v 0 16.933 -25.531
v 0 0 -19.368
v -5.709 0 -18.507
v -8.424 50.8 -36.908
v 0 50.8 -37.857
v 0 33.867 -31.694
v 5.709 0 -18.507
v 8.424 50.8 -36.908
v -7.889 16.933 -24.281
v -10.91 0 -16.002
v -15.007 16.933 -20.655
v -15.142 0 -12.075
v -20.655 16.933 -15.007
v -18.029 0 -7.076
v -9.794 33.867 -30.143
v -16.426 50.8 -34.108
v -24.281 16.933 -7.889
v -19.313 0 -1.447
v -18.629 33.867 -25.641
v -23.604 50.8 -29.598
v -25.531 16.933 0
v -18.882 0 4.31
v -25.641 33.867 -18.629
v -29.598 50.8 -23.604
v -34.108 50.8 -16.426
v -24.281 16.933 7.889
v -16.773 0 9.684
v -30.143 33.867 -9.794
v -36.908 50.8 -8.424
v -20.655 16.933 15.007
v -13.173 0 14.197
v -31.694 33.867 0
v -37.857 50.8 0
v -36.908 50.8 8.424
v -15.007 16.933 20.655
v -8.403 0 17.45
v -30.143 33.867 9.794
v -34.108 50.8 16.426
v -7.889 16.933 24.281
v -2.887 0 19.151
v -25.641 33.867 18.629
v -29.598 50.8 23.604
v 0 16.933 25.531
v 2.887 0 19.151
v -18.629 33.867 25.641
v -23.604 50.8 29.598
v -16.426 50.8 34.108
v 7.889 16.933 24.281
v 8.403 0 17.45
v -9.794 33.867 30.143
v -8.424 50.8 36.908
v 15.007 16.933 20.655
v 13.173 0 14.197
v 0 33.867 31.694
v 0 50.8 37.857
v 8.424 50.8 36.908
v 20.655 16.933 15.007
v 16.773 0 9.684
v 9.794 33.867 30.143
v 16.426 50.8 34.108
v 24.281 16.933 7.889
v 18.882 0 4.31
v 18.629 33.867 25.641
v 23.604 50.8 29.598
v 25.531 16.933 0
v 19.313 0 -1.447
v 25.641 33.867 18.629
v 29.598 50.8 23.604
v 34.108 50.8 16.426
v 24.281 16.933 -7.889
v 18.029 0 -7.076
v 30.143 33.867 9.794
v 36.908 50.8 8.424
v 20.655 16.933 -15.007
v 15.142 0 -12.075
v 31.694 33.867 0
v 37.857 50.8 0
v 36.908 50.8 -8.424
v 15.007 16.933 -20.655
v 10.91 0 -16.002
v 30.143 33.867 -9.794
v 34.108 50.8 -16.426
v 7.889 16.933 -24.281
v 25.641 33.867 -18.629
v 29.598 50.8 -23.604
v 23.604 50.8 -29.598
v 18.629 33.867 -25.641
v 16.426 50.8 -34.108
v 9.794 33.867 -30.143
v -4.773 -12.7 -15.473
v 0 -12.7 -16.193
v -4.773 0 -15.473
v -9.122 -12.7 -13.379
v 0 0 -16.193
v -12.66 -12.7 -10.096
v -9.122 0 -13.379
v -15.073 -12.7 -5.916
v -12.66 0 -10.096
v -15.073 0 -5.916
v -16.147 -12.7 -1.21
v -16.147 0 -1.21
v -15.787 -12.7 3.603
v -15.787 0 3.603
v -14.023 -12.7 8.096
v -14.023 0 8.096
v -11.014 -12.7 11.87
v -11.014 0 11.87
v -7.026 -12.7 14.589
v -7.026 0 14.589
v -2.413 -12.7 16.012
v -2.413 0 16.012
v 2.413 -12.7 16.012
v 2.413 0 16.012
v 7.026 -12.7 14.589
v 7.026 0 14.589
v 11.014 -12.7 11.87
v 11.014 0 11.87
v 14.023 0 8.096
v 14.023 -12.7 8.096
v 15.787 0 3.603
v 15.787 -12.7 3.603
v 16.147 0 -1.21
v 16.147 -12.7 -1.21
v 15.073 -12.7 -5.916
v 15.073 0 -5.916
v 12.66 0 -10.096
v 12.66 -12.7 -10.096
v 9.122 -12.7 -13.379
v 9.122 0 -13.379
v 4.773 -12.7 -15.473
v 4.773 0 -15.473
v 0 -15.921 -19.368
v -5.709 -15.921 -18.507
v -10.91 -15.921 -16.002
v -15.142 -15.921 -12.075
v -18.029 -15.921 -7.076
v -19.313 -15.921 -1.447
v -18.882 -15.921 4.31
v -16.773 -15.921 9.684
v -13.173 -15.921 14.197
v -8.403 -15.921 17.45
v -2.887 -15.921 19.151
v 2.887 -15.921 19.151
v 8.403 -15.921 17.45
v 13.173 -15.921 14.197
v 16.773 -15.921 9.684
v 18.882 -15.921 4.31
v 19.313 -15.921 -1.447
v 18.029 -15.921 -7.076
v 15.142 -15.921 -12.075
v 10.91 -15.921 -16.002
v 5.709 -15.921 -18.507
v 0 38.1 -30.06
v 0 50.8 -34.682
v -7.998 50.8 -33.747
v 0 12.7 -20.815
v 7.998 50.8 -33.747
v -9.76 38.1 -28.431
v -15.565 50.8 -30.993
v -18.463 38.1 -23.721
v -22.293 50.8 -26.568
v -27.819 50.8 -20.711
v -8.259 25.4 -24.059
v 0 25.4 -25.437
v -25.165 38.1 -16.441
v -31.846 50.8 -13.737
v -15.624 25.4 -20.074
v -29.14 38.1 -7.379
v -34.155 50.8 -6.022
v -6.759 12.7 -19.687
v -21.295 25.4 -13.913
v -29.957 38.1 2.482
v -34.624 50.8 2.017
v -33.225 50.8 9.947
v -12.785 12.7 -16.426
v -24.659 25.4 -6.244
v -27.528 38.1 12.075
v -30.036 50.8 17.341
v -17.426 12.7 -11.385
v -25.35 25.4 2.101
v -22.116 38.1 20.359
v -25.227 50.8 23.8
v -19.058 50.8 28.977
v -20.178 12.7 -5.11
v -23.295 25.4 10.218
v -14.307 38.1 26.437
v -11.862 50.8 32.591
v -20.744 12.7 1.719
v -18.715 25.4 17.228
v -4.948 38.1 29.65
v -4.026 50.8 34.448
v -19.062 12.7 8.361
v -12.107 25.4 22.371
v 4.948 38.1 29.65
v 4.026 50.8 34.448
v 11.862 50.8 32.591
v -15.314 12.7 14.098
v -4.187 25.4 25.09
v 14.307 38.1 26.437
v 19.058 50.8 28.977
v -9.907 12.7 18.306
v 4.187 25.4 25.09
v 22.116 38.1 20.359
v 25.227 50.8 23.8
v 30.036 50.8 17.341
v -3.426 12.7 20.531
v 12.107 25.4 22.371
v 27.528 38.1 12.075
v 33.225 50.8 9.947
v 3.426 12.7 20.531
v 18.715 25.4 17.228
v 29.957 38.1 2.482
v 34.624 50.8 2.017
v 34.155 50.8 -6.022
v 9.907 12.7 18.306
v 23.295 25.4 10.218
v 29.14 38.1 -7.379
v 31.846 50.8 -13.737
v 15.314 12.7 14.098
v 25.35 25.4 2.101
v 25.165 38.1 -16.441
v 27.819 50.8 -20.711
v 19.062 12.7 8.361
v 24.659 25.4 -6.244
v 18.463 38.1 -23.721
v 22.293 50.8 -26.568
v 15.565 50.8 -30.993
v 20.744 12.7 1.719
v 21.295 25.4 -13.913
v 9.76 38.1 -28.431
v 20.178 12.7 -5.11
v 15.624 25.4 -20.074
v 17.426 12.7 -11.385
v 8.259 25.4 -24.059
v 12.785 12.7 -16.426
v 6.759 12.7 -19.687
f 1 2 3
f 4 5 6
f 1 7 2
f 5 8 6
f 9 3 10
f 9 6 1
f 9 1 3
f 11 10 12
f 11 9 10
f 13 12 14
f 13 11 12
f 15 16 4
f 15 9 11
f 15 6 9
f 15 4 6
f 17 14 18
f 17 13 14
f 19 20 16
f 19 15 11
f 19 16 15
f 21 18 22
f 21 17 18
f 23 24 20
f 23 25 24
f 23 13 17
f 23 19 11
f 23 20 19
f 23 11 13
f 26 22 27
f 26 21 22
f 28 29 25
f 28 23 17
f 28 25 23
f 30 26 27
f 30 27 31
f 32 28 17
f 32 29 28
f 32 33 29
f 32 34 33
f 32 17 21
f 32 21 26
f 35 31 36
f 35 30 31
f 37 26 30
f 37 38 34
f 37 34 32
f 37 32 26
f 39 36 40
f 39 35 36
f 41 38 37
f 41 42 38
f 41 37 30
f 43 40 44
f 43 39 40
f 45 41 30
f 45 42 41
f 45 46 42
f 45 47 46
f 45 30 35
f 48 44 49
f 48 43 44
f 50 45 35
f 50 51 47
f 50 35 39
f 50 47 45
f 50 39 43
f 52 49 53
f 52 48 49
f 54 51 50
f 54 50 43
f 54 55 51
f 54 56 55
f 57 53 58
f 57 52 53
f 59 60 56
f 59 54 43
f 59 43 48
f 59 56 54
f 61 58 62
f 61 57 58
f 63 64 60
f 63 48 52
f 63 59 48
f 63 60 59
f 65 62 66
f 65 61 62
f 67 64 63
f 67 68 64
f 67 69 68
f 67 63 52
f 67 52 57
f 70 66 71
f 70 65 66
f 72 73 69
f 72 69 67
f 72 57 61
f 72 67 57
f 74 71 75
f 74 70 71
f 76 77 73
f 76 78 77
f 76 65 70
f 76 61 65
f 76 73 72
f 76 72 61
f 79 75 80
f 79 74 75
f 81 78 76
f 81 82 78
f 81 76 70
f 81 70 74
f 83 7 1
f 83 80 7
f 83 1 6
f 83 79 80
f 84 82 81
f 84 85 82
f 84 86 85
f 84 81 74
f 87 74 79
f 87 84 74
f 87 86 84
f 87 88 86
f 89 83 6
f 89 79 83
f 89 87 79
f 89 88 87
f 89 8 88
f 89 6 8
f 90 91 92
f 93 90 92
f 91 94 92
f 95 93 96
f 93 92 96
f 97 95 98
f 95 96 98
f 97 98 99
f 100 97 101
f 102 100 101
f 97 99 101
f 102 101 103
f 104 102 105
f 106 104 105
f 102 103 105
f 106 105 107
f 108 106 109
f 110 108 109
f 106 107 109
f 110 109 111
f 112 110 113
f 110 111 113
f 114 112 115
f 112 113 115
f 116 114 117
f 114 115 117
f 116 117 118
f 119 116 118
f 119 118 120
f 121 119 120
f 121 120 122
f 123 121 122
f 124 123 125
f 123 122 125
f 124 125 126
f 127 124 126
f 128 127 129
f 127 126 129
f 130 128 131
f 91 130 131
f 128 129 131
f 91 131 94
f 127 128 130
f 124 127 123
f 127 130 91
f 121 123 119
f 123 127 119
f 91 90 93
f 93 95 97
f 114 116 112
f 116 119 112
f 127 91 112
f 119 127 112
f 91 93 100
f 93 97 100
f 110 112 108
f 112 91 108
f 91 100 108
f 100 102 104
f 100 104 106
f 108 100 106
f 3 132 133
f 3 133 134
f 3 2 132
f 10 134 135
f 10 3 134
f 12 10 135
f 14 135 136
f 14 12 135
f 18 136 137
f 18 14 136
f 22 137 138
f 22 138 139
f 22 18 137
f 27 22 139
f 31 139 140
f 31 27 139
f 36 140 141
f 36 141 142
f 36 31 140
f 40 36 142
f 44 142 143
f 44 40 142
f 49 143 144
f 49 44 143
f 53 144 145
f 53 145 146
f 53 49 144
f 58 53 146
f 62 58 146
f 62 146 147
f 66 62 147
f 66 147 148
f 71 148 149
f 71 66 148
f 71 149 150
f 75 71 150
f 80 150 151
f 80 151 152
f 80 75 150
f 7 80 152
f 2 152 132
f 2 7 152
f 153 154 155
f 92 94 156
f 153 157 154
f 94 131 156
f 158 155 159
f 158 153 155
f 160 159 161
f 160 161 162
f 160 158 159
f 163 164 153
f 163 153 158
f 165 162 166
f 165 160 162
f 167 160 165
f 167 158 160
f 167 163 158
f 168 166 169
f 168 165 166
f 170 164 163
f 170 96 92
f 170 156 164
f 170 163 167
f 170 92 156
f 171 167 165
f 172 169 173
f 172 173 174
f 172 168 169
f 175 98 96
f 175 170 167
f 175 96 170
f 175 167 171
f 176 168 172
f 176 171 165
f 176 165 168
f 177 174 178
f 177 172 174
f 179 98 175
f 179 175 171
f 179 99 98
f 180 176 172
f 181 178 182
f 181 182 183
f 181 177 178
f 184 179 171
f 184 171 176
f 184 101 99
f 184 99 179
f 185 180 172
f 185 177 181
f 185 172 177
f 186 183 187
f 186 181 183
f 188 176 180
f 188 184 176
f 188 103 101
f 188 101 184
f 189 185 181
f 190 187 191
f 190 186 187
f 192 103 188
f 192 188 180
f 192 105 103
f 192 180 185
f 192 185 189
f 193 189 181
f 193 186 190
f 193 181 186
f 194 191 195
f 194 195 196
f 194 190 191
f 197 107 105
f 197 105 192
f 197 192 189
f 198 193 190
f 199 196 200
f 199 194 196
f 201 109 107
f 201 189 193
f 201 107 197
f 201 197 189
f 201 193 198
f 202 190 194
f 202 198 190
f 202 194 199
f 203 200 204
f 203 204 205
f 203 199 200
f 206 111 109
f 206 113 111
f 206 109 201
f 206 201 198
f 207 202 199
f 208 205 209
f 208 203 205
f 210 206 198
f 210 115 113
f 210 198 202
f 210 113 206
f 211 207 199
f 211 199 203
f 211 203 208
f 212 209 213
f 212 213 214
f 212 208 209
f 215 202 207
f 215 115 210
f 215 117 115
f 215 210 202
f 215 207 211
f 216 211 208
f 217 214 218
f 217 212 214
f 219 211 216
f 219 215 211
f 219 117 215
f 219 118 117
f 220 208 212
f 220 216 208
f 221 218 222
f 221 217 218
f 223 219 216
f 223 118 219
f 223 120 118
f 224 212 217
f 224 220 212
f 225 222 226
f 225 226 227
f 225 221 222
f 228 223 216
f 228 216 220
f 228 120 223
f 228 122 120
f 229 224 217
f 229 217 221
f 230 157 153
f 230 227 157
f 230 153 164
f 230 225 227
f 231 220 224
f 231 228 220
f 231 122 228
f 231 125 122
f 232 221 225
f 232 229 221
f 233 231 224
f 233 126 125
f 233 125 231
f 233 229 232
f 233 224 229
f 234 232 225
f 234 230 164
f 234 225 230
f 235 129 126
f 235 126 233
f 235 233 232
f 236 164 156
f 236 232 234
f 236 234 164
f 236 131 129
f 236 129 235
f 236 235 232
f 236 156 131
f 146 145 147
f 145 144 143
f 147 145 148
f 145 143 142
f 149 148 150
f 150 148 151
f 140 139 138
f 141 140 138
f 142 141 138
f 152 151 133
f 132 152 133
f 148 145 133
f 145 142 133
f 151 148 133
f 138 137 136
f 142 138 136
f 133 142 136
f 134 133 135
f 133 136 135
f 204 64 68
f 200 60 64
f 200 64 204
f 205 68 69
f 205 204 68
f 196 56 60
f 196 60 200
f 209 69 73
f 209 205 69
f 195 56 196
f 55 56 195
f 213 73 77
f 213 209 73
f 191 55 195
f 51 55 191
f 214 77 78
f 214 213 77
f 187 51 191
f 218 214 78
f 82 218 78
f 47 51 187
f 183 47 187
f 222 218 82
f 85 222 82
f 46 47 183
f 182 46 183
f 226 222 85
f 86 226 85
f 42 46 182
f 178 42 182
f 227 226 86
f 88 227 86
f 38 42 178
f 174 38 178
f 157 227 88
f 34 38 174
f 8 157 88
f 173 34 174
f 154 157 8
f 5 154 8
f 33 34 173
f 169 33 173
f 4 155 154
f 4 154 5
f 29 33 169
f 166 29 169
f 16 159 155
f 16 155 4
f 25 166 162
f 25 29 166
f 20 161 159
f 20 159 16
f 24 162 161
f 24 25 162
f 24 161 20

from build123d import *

# Parameters (mm, degrees)
SKETCH1_W = 3.175
SKETCH1_H = 12.7


with BuildPart() as part:
    # Sketch1 → Revolve1 (revolve)
    with BuildSketch(Plane.XY, mode=Mode.PRIVATE) as revolve1_sk:
        Polygon((19.3675, 0), (37.857187901, 50.8), (34.682187901, 50.8), (16.1925, 0), align=None)
        with Locations((17.78, -6.35)):
            Rectangle(SKETCH1_W, SKETCH1_H)
        Polygon((0, -12.7), (16.1925, -12.7), (19.3675, -12.7), (19.3675, -15.920602993), (0, -15.920602993), align=None)
    revolve(revolve1_sk.sketch.rotate(Axis((0, 0, 0), (0, 1, 0)), 90), axis=Axis((0, 0, 0), (0, 1, 0)))


solid = part.part
